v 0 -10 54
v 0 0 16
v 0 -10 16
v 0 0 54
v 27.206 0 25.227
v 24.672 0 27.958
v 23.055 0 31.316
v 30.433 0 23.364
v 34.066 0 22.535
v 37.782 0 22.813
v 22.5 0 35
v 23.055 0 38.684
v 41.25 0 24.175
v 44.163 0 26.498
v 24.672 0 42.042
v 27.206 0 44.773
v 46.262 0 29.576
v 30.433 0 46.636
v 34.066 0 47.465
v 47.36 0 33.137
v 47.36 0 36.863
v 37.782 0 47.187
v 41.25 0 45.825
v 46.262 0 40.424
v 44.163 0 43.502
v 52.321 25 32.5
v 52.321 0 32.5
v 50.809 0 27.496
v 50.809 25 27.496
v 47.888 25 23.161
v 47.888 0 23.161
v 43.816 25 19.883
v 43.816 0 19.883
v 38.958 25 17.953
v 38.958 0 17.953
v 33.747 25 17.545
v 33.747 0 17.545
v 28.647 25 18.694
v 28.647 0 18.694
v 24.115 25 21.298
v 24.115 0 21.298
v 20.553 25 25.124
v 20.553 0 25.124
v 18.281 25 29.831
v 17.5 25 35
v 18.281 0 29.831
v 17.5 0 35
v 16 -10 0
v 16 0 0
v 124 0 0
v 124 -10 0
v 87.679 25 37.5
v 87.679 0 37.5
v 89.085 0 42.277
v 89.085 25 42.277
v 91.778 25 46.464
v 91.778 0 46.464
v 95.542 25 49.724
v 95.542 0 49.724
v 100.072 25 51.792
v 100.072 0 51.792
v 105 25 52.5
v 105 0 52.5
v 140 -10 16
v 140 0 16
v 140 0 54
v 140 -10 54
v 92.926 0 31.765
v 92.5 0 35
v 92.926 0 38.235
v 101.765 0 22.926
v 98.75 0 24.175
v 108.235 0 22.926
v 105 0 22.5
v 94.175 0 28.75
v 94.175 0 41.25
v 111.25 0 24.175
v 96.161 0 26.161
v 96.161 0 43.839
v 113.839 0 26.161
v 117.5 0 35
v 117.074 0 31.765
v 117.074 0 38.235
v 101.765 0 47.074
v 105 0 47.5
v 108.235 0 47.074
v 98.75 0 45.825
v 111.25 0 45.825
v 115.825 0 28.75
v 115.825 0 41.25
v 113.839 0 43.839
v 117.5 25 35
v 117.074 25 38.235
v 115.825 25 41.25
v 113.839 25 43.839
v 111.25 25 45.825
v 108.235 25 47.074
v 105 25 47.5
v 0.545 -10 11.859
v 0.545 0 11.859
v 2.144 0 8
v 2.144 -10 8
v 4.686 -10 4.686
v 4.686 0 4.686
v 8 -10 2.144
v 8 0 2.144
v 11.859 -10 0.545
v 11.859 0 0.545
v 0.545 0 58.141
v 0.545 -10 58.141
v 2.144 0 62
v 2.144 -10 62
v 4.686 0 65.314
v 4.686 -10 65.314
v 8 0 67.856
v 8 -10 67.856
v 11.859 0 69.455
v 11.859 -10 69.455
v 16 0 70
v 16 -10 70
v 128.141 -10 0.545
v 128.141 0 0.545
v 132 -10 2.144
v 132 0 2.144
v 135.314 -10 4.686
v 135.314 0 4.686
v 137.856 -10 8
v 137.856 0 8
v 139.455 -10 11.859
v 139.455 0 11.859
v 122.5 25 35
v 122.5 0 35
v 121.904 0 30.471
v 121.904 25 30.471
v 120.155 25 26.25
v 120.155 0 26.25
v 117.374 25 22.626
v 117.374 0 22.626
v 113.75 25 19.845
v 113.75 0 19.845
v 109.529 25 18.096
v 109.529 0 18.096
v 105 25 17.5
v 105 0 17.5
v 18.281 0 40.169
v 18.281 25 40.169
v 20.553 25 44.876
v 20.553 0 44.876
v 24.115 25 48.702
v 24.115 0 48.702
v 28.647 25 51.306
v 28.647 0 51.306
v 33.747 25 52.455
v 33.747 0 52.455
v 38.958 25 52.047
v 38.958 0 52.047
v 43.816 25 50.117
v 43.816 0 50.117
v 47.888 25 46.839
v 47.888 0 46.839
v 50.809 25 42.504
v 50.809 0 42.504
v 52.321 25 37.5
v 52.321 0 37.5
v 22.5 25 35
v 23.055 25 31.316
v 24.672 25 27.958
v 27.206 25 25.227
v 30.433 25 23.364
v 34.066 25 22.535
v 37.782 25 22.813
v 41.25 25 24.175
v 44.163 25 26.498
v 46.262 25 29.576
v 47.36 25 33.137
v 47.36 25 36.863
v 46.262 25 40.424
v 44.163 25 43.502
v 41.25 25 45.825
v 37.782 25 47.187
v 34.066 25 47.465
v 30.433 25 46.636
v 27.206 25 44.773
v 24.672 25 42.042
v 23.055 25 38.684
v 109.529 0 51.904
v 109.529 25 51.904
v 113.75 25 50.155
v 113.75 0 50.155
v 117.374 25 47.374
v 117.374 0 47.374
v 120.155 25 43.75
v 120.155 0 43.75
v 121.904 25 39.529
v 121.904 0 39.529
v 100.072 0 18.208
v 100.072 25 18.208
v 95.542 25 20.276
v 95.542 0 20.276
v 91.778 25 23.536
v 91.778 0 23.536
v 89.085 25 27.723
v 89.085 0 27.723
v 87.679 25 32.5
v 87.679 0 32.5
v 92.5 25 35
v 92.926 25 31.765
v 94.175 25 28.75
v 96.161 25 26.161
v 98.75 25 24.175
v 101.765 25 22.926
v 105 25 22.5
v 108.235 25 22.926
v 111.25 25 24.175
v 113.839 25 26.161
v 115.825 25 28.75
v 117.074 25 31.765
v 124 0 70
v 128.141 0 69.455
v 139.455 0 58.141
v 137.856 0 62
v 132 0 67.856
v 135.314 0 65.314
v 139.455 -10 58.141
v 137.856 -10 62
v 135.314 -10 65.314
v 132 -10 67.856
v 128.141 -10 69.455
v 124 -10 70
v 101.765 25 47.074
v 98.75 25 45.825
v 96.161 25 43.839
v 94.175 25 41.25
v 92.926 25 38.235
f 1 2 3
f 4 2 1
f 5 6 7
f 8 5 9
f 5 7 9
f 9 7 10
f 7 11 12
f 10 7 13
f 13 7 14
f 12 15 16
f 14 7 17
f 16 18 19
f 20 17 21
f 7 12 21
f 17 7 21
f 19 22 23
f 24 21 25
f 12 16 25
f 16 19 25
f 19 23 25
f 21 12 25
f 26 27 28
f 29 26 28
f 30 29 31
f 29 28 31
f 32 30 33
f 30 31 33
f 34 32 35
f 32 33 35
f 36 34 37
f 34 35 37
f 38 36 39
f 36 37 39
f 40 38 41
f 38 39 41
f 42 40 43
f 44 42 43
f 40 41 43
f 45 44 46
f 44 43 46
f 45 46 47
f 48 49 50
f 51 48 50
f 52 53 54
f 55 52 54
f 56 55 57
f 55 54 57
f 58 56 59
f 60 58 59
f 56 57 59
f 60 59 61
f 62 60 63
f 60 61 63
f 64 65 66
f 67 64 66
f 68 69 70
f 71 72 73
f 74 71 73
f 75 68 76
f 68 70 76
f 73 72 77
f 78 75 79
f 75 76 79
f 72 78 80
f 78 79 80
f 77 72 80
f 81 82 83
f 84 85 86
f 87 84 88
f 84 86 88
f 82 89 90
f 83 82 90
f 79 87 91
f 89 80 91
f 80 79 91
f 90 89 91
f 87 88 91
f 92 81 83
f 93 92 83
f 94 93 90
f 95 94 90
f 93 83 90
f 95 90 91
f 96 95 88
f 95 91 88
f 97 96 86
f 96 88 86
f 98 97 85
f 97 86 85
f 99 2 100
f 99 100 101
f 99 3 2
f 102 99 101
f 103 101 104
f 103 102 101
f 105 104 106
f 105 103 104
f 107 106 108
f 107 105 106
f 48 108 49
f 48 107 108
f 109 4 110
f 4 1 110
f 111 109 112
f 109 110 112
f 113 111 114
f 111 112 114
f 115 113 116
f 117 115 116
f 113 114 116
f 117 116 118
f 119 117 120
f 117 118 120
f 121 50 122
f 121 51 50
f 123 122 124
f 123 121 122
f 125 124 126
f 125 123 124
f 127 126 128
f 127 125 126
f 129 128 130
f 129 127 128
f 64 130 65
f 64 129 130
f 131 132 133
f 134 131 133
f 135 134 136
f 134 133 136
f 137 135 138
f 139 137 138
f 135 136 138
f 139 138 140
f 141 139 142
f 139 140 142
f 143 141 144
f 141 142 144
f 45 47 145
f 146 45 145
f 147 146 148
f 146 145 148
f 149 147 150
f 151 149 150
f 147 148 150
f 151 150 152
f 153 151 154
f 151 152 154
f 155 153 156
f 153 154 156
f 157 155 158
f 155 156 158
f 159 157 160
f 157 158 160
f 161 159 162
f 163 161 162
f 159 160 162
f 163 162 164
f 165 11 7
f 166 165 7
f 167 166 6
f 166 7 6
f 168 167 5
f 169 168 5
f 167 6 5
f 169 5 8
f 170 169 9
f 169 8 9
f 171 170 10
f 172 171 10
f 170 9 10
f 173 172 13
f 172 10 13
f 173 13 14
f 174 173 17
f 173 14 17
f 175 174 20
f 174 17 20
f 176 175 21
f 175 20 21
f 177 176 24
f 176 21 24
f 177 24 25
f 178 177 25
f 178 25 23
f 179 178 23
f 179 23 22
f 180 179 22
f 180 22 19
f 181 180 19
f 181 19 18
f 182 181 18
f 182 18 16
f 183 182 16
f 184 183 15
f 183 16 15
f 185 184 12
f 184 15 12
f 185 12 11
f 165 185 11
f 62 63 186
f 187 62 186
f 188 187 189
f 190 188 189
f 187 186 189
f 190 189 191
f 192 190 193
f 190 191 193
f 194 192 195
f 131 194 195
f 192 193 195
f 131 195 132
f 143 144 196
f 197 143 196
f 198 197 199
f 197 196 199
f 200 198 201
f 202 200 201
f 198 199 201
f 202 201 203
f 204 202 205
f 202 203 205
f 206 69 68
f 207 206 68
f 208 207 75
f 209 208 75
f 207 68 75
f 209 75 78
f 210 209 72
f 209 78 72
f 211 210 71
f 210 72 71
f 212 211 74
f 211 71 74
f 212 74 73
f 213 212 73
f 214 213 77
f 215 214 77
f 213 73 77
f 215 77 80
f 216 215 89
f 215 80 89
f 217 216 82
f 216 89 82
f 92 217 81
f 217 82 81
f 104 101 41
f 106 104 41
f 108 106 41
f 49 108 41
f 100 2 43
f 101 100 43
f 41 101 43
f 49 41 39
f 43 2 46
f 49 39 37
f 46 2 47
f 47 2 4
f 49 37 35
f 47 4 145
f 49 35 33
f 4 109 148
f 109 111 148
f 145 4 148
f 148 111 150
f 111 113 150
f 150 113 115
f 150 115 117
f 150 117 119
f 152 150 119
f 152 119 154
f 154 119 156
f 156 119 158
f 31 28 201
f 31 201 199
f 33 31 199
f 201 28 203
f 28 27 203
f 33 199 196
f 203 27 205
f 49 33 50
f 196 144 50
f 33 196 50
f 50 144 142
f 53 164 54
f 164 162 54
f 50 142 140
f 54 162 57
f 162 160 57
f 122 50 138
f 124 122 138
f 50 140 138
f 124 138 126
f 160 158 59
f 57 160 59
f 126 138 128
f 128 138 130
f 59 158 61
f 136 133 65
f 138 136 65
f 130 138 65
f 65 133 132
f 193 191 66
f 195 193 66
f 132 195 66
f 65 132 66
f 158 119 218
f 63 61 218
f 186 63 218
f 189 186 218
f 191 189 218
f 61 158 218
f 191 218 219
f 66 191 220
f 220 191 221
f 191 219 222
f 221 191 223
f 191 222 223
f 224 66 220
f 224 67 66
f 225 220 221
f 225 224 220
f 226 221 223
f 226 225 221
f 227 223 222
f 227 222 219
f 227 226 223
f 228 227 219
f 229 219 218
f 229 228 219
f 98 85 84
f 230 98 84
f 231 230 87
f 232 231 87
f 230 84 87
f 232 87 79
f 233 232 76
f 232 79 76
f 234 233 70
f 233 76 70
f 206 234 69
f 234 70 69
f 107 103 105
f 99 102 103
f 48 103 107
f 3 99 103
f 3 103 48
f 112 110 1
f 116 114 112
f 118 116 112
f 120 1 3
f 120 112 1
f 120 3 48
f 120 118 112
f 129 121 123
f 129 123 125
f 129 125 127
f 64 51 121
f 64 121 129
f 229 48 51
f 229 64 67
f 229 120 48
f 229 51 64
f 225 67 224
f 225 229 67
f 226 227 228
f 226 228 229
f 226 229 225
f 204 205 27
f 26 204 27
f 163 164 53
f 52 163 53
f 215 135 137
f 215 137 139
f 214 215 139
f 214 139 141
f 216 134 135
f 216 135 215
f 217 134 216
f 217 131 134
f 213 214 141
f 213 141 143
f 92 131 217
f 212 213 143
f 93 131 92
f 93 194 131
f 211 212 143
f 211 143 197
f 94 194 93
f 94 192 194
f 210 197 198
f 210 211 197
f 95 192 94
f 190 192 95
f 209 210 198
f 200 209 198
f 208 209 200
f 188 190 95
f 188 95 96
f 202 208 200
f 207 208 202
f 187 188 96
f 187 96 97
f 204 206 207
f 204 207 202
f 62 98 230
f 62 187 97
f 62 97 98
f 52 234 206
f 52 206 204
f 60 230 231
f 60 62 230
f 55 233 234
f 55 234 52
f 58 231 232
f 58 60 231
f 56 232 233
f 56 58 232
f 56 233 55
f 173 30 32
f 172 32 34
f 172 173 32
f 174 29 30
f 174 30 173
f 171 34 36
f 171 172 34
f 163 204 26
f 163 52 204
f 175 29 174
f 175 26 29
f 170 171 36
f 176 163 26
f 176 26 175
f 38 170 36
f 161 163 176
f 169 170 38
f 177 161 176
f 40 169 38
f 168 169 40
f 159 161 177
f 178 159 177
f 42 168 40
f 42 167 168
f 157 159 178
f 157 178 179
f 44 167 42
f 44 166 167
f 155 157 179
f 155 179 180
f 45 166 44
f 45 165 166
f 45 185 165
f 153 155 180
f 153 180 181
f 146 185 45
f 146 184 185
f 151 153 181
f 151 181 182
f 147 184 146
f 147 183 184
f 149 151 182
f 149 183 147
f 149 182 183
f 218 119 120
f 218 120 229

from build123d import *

# Parameters (mm, degrees)
F0_W     = 140
F0_H     = 70
F1_DEPTH = 10
F2_R     = 16
F4_DEPTH = 25


with BuildPart() as f1:
    # F0 (on Front) → F1 (new body)
    with BuildSketch(Plane.XZ):
        with Locations((70, 35)):
            Rectangle(F0_W, F0_H)
    extrude(amount=F1_DEPTH)

    # F2
    f2_edges = [f1.edges().sort_by_distance(p)[0] for p in [
        (0, -5, 0),
        (140, -5, 0),
        (140, -5, 70),
        (0, -5, 70),
    ]]
    fillet(f2_edges, radius=F2_R)

    # F3 (on face) → F4 (join)
    with BuildSketch(Plane(origin=(0, 0, 0), x_dir=(-1, 0, 0), z_dir=(0, 1, 0))):
        with BuildLine():
            ThreePointArc((-105, 47.5), (-96.1611652352, 43.8388347648), (-92.5, 35))
            Line((-92.5, 35), (-87.5, 35))
            ThreePointArc((-87.5, 35), (-87.5449306601, 36.2532175939), (-87.6794919243, 37.5))
            ThreePointArc((-87.6794919243, 37.5), (-93.5435607626, 48.2287565553), (-105, 52.5))
            Line((-105, 52.5), (-105, 47.5))
        make_face()
        with BuildLine():
            ThreePointArc((-117.5, 35), (-113.8388347648, 43.8388347648), (-105, 47.5))
            Line((-105, 47.5), (-105, 52.5))
            ThreePointArc((-105, 52.5), (-117.3743686708, 47.3743686708), (-122.5, 35))
            Line((-122.5, 35), (-117.5, 35))
        make_face()
        with BuildLine():
            Line((-105, 17.5), (-105, 22.5))
            ThreePointArc((-105, 22.5), (-113.8388347648, 26.1611652352), (-117.5, 35))
            Line((-117.5, 35), (-122.5, 35))
            ThreePointArc((-122.5, 35), (-117.3743686708, 22.6256313292), (-105, 17.5))
        make_face()
        with BuildLine():
            Line((-87.5, 35), (-92.5, 35))
            ThreePointArc((-92.5, 35), (-96.1611652352, 26.1611652352), (-105, 22.5))
            Line((-105, 22.5), (-105, 17.5))
            ThreePointArc((-105, 17.5), (-93.5435607626, 21.7712434447), (-87.6794919243, 32.5))
            ThreePointArc((-87.6794919243, 32.5), (-87.5449306601, 33.7467824061), (-87.5, 35))
        make_face()
        with BuildLine():
            ThreePointArc((-52.3205080757, 37.5), (-52.4550693399, 36.2532175939), (-52.5, 35))
            Line((-52.5, 35), (-47.5, 35))
            ThreePointArc((-47.5, 35), (-35, 47.5), (-22.5, 35))
            Line((-22.5, 35), (-17.5, 35))
            ThreePointArc((-17.5, 35), (-33.7467824061, 52.4550693399), (-52.3205080757, 37.5))
        make_face()
        with BuildLine():
            Line((-47.5, 35), (-52.5, 35))
            ThreePointArc((-52.5, 35), (-52.4550693399, 33.7467824061), (-52.3205080757, 32.5))
            ThreePointArc((-52.3205080757, 32.5), (-33.7467824061, 17.5449306601), (-17.5, 35))
            Line((-17.5, 35), (-22.5, 35))
            ThreePointArc((-22.5, 35), (-35, 22.5), (-47.5, 35))
        make_face()
        with BuildLine():
            ThreePointArc((-87.6794919243, 37.5), (-87.5449306601, 36.2532175939), (-87.5, 35))
            Line((-87.5, 35), (-52.5, 35))
            ThreePointArc((-52.5, 35), (-52.4550693399, 36.2532175939), (-52.3205080757, 37.5))
            Line((-52.3205080757, 37.5), (-70, 37.5))
            Line((-70, 37.5), (-87.6794919243, 37.5))
        make_face()
        with BuildLine():
            Line((-52.5, 35), (-87.5, 35))
            ThreePointArc((-87.5, 35), (-87.5449306601, 33.7467824061), (-87.6794919243, 32.5))
            Line((-87.6794919243, 32.5), (-70, 32.5))
            Line((-70, 32.5), (-52.3205080757, 32.5))
            ThreePointArc((-52.3205080757, 32.5), (-52.4550693399, 33.7467824061), (-52.5, 35))
        make_face()
    extrude(amount=F4_DEPTH)


solid = f1.part
